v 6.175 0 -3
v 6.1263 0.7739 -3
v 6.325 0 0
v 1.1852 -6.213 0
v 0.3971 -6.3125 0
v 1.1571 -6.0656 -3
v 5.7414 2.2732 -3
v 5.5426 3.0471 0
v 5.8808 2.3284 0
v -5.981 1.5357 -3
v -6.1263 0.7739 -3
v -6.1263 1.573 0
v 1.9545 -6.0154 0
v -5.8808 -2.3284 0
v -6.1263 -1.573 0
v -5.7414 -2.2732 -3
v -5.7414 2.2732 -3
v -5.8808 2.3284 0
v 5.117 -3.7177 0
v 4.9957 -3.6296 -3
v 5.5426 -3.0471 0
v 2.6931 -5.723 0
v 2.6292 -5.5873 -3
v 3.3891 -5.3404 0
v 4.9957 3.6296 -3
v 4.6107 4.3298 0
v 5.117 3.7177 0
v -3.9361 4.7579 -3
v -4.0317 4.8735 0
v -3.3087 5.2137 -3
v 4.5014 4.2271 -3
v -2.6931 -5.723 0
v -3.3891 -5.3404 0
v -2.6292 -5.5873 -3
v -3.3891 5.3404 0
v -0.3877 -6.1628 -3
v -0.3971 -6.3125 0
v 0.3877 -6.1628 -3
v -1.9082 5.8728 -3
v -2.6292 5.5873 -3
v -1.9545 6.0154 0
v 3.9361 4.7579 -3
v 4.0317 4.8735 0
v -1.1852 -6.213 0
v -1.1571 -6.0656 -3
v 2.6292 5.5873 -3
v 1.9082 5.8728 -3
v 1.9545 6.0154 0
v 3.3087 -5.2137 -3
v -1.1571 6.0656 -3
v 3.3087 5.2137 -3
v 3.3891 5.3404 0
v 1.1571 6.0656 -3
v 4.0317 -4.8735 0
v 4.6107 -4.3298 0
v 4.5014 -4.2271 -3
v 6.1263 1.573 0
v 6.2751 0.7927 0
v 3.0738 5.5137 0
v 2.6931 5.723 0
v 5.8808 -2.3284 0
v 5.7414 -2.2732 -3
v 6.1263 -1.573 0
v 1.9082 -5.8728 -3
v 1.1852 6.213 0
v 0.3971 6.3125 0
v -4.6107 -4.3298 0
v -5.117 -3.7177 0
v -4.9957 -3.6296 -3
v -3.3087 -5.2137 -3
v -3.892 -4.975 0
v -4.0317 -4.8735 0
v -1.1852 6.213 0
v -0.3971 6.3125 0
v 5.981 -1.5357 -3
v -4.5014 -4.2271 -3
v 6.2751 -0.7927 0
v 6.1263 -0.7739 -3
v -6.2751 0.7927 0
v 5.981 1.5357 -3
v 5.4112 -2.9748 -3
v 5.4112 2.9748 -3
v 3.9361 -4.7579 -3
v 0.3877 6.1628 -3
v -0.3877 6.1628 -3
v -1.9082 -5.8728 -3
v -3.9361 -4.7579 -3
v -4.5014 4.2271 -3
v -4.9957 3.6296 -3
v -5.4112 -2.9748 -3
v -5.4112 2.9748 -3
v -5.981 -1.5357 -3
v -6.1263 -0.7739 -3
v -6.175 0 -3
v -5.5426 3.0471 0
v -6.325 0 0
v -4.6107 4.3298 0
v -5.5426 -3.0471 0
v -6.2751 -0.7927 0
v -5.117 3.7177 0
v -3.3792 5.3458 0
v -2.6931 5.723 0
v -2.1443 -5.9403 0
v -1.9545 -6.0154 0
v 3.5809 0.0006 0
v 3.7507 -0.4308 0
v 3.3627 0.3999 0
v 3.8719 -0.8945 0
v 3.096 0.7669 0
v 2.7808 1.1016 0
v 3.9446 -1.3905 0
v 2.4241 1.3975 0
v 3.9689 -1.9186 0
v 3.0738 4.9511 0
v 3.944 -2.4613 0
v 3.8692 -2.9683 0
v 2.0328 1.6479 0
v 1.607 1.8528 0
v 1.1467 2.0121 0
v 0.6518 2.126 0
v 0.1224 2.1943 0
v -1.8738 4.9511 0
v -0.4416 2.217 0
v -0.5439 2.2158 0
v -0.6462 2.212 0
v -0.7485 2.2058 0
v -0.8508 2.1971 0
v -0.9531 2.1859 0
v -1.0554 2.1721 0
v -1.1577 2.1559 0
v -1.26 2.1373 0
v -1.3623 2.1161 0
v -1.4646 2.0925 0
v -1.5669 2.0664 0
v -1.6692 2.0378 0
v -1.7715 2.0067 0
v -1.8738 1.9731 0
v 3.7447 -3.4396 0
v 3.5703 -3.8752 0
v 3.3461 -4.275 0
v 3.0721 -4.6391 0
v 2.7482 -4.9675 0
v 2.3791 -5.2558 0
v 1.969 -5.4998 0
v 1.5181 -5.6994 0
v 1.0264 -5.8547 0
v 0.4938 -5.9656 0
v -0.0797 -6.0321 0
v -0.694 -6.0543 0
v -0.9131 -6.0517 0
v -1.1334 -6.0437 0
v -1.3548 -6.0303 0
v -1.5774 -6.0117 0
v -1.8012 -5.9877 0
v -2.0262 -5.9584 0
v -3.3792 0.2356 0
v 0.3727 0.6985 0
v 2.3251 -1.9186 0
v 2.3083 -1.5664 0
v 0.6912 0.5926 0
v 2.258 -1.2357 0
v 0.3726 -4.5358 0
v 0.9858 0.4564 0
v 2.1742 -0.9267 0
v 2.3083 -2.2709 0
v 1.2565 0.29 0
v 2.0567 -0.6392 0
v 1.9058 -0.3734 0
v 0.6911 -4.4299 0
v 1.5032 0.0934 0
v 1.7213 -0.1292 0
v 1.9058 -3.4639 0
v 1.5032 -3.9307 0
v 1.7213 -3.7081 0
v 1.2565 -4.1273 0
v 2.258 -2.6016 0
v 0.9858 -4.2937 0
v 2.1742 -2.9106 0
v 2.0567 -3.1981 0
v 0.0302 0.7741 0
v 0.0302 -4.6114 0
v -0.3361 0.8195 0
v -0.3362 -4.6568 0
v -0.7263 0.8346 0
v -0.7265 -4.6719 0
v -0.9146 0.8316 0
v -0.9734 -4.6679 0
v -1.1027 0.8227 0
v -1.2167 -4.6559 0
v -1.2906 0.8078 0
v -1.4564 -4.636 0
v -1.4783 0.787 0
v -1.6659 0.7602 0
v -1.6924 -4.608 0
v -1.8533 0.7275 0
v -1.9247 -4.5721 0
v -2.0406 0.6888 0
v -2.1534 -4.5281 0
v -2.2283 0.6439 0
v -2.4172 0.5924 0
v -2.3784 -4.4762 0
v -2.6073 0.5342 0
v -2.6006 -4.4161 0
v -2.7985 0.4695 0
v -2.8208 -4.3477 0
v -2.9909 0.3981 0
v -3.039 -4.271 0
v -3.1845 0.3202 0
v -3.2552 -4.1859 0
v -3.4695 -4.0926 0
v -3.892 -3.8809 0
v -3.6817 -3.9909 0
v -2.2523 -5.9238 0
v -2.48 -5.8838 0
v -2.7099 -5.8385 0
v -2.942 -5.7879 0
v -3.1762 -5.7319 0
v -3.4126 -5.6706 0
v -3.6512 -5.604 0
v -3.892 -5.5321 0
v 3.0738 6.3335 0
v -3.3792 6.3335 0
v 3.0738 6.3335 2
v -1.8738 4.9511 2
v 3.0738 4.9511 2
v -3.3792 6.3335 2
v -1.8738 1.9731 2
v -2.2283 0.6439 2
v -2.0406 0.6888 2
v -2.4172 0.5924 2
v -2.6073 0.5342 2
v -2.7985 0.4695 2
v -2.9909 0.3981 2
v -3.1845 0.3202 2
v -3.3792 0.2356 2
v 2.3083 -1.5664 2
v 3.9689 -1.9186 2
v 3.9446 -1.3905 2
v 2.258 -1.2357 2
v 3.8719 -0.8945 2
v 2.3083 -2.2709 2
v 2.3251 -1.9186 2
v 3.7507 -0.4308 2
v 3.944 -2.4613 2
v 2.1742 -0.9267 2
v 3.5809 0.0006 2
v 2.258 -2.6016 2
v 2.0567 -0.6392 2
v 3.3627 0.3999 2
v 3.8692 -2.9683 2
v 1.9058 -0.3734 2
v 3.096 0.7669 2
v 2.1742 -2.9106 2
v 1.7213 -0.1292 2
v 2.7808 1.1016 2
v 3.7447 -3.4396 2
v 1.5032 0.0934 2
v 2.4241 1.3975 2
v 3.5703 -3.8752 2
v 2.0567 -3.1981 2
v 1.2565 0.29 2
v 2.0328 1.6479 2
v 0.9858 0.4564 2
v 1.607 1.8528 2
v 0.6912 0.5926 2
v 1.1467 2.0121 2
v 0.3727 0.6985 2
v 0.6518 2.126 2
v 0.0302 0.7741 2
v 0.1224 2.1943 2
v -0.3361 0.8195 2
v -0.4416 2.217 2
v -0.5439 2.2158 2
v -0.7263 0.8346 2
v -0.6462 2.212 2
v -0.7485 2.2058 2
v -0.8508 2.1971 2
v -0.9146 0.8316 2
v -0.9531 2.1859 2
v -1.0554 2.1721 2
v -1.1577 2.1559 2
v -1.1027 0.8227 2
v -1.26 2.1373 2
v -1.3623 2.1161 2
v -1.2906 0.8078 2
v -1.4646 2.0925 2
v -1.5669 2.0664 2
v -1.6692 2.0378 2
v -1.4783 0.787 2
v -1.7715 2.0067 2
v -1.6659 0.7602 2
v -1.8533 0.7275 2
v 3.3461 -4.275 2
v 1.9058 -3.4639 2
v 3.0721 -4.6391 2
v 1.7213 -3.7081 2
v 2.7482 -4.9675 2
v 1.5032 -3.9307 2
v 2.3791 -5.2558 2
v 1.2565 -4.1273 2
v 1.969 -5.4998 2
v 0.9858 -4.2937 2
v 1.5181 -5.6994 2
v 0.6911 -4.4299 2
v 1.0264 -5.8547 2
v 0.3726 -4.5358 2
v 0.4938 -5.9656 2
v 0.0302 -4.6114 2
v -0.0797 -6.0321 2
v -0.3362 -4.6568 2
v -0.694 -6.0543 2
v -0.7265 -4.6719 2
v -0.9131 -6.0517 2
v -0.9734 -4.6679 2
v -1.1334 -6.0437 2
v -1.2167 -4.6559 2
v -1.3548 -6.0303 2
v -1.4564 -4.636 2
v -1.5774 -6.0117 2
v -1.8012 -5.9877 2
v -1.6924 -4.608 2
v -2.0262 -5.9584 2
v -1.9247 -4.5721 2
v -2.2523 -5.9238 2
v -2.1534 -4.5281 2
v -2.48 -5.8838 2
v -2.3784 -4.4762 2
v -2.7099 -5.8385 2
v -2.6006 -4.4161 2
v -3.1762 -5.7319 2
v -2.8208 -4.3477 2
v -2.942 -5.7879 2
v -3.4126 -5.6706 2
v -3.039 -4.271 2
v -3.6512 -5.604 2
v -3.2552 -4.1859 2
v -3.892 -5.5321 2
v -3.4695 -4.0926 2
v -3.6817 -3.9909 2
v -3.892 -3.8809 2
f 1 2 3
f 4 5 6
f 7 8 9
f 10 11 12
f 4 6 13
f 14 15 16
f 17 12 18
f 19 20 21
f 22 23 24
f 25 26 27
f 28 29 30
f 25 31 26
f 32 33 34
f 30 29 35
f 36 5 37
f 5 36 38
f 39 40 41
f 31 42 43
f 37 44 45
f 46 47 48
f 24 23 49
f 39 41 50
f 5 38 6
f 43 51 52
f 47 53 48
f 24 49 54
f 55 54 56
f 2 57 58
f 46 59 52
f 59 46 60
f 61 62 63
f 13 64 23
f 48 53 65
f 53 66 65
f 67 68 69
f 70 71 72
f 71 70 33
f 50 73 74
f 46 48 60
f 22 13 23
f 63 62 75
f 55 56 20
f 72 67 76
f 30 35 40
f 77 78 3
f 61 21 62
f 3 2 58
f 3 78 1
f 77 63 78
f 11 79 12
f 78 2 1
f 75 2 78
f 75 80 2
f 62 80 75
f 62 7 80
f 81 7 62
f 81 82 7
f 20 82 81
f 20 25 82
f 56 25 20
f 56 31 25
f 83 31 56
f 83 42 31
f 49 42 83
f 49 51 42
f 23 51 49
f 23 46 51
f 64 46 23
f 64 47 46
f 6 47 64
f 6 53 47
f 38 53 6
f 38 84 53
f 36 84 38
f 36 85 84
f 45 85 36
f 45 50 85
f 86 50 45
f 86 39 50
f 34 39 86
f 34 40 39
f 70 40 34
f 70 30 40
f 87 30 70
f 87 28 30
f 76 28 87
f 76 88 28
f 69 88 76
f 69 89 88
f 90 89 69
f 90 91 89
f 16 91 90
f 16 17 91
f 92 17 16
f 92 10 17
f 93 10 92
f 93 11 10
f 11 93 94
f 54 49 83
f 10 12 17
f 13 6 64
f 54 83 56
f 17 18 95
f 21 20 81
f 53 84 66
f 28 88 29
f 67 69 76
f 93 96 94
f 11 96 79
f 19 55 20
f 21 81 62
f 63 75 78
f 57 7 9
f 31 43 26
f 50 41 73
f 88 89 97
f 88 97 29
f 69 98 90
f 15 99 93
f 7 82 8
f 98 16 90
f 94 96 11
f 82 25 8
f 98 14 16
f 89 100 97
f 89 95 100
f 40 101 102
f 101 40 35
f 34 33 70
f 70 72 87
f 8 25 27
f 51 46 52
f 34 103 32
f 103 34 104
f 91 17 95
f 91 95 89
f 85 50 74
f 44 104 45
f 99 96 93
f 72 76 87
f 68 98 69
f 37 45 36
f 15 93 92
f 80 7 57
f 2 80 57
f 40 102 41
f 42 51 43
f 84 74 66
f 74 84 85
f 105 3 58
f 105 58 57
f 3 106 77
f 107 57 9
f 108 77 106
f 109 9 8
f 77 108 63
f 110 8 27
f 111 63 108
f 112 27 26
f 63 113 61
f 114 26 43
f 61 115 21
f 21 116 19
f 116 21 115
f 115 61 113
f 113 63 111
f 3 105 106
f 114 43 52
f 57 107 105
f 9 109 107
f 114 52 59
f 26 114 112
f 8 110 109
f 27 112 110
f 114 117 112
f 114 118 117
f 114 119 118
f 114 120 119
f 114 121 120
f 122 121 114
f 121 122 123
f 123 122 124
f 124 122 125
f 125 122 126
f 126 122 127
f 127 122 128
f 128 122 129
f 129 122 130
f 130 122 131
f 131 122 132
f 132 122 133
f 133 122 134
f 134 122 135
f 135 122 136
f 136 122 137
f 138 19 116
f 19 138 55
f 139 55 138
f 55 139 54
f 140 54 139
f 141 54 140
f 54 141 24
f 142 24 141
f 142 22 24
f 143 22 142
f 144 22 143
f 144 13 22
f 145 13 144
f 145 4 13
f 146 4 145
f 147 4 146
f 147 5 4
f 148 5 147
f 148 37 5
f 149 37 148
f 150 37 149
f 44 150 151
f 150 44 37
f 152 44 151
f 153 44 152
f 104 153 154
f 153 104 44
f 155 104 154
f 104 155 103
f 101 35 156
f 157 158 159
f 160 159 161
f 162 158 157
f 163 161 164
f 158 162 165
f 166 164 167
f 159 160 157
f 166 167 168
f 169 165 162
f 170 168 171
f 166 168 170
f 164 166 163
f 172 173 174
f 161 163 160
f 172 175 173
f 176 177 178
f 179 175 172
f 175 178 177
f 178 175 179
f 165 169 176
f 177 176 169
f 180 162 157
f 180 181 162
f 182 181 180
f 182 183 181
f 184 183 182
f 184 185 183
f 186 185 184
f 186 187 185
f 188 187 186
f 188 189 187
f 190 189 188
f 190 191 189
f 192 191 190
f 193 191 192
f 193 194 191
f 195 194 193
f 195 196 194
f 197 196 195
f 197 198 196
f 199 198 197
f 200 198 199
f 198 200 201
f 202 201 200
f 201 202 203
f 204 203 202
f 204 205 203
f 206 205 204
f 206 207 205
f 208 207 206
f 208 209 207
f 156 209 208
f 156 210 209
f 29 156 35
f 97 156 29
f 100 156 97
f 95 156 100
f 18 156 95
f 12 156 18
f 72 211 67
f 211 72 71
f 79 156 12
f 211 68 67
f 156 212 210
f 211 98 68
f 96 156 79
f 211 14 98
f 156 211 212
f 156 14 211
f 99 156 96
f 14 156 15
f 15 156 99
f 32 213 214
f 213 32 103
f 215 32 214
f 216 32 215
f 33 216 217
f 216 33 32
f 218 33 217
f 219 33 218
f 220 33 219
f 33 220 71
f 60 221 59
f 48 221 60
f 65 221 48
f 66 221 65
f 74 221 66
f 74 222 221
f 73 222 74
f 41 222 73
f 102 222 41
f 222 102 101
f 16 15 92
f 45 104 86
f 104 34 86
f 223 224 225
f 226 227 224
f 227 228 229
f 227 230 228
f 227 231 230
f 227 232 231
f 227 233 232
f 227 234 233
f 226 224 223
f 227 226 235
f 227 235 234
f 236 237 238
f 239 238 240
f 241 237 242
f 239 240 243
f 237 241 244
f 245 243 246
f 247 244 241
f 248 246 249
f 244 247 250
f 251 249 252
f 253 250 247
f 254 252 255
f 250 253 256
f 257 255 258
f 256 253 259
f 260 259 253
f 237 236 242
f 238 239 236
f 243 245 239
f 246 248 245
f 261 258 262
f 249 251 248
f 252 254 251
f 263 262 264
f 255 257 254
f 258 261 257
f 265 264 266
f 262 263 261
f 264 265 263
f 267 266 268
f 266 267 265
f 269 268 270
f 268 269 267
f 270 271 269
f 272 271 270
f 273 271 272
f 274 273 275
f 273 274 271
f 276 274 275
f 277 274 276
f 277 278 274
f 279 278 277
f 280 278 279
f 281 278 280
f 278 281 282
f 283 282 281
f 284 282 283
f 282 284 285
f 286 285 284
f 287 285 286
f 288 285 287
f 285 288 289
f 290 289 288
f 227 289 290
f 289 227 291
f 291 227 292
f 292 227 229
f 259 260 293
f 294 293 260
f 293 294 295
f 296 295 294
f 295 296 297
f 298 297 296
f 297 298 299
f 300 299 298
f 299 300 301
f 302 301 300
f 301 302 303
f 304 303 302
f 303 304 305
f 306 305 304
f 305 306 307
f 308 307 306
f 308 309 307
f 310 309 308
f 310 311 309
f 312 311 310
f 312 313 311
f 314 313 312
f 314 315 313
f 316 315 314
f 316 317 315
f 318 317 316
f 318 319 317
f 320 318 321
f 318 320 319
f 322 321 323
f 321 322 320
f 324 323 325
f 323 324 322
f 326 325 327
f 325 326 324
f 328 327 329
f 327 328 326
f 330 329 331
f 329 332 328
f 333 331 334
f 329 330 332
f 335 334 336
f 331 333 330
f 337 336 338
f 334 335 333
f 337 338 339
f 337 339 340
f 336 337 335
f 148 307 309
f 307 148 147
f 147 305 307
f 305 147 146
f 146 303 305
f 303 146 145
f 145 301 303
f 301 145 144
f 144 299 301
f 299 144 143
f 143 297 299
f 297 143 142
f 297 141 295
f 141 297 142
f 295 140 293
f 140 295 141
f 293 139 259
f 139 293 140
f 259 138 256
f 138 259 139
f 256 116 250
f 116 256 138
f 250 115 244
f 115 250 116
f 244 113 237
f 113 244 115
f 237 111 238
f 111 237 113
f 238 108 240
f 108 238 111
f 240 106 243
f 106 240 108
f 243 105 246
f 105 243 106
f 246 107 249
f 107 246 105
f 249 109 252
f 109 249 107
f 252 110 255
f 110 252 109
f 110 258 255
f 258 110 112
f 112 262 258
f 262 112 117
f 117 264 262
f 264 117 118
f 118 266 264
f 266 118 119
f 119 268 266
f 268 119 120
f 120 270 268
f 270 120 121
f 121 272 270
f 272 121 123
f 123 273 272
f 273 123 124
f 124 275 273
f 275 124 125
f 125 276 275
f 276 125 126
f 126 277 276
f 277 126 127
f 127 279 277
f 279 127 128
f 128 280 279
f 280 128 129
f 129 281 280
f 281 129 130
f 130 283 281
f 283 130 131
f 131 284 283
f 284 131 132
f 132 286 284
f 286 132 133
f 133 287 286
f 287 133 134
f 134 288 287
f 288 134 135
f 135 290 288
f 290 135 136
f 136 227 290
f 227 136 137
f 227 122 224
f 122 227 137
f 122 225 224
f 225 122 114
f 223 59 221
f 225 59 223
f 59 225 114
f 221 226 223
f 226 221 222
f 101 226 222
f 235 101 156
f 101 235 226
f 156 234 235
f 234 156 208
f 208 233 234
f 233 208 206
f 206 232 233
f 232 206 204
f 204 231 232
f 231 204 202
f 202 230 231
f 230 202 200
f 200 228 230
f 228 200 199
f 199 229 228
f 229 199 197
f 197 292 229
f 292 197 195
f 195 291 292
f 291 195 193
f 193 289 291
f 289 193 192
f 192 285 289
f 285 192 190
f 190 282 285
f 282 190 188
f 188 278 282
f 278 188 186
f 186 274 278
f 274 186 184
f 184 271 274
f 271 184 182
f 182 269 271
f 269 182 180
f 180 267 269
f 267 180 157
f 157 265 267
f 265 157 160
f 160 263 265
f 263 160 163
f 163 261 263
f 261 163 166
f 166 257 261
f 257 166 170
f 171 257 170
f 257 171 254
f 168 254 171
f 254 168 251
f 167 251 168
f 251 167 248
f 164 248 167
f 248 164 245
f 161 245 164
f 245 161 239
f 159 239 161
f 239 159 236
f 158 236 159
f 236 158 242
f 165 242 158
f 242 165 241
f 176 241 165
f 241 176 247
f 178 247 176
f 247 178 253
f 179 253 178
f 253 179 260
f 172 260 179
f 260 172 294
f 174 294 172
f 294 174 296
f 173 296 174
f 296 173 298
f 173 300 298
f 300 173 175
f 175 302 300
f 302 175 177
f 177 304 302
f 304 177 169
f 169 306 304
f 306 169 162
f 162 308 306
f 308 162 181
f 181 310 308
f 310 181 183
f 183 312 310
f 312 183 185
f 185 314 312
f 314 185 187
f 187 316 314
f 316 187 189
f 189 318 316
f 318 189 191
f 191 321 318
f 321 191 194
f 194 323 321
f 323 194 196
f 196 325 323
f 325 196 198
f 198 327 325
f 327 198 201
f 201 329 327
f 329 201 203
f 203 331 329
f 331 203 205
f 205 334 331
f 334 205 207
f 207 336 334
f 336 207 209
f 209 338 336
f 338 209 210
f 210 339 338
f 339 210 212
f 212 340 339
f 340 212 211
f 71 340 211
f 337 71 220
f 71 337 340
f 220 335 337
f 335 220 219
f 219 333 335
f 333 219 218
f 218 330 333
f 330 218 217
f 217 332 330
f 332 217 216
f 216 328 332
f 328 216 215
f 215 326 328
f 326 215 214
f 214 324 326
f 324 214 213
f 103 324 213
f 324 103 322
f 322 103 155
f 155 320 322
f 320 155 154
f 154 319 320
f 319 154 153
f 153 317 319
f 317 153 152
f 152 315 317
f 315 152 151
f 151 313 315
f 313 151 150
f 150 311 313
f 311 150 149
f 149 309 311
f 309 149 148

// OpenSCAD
$fn = 50;

difference() {
	union() {
		translate(v = [0, 0, -3.0]) {
			cylinder(h = 3, r1 = 6.175, r2 = 6.325);
		}
		linear_extrude(height = 2) {
			text(font = "Impact", halign = "center", size = 12, text = "5", valign = "center");
		}
	}
	union();
}
